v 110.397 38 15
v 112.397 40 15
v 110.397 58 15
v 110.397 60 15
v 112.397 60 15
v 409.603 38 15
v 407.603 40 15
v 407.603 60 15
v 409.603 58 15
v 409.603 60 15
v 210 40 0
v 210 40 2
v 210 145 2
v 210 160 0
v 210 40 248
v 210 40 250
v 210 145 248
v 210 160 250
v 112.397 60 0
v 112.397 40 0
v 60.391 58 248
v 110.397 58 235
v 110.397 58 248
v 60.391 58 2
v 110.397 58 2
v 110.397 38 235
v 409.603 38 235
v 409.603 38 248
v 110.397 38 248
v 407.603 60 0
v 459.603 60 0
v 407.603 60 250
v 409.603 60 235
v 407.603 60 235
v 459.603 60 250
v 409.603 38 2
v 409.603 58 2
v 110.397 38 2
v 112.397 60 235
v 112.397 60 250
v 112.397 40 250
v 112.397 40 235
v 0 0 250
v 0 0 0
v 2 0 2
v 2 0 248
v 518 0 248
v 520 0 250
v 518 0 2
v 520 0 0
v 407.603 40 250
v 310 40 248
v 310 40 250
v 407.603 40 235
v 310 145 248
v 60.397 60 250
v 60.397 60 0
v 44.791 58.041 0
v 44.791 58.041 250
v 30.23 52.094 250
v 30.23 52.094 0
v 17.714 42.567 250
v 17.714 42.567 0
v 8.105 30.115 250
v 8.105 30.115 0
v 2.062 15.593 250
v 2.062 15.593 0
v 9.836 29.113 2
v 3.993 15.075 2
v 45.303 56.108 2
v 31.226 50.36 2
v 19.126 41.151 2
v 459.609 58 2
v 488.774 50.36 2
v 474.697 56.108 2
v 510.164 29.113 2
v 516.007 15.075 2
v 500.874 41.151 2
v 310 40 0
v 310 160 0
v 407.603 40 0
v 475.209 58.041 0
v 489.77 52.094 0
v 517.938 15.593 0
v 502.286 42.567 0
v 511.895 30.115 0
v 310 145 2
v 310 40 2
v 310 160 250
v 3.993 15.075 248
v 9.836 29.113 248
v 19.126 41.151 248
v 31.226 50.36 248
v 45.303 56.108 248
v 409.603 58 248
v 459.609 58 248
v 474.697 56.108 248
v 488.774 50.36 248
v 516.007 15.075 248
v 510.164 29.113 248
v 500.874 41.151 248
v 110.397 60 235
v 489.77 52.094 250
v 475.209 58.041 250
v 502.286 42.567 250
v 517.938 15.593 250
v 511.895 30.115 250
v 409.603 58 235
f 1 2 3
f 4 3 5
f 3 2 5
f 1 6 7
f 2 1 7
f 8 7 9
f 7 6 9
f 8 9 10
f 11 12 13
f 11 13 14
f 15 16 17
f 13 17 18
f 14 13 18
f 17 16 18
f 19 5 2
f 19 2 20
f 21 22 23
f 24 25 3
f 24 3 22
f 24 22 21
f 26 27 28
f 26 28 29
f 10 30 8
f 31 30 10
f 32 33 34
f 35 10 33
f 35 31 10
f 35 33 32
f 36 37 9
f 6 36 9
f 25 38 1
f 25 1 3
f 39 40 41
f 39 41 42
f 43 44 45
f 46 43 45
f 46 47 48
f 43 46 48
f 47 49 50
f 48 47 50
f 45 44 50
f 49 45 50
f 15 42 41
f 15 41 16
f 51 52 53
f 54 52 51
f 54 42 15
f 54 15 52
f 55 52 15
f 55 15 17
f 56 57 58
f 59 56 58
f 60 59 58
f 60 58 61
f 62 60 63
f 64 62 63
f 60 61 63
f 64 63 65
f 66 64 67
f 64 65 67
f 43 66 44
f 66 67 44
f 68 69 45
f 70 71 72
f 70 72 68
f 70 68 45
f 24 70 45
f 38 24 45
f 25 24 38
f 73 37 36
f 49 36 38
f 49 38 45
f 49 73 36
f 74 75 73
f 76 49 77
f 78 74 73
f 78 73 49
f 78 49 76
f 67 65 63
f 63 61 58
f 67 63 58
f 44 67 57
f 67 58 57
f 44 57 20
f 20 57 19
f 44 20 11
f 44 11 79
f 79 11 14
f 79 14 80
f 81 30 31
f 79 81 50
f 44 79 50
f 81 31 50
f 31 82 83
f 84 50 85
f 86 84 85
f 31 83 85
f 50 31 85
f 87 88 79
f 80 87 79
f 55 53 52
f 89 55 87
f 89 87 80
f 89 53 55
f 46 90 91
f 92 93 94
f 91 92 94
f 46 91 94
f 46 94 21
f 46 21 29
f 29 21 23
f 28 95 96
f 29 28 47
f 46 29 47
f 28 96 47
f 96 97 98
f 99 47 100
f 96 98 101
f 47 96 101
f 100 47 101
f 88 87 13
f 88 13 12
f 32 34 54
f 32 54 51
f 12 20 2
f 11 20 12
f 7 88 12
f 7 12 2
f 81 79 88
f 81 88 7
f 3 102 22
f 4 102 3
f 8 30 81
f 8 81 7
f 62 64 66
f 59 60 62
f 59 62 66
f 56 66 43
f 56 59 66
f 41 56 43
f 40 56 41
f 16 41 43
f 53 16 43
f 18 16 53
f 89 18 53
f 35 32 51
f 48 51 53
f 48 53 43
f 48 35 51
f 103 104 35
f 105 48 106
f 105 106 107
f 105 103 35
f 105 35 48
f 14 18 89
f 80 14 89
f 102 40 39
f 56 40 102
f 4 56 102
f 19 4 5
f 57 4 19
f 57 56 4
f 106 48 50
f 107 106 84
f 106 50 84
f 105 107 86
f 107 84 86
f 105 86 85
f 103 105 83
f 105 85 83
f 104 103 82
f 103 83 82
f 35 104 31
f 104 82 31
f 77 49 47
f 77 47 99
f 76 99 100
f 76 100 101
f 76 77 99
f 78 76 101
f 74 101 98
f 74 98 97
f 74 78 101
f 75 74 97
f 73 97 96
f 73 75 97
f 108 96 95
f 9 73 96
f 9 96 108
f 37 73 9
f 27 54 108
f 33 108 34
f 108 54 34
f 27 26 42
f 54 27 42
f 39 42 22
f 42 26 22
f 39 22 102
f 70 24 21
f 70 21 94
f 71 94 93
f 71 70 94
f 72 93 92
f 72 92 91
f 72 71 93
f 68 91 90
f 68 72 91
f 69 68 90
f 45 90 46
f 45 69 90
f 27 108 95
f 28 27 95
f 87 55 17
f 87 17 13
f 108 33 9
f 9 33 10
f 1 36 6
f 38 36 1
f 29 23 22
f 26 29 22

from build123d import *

# Parameters (mm, degrees)
BOSS_EXTRUDE1_DEPTH = 250
SKETCH2_W           = 299.205309142
SKETCH2_H           = 220
CUT_EXTRUDE1_DEPTH  = 581.086200491
SKETCH4_W           = 299.205309142
SKETCH4_H           = 15
CUT_EXTRUDE2_DEPTH  = 20
SHELL1_START        = 2
SHELL1_DEPTH        = 246
SKETCH5_W           = 15
SKETCH5_H           = 20
BOSS_EXTRUDE2_DEPTH = 2
SKETCH6_W           = 15
SKETCH6_H           = 20
BOSS_EXTRUDE3_DEPTH = 2
SKETCH7_W           = 100
SKETCH7_H           = 120
BOSS_EXTRUDE4_DEPTH = 250
CUT_EXTRUDE3_DEPTH  = 100


# Read off the part's stored shape, not the designer's step: Shell1
with BuildPart() as part:
    # Sketch1 → Boss-Extrude1 (new body)
    with BuildSketch(Plane.XY):
        with BuildLine():
            Line((0, 0), (520, 0))
            ThreePointArc((520, 0), (502.285771516, 42.567121511), (459.602654571, 60))
            Line((459.602654571, 60), (60.397345429, 60))
            ThreePointArc((60.397345429, 60), (17.714228484, 42.567121511), (0, 0))
        make_face()
    extrude(amount=BOSS_EXTRUDE1_DEPTH)

    # Sketch2 → Cut-Extrude1 (cut, through all)
    with BuildSketch(Plane(origin=(0, 60, 0), x_dir=(1, 0, 0), z_dir=(0, 1, 0))):
        with Locations((260, -125)):
            Rectangle(SKETCH2_W, SKETCH2_H)
    extrude(amount=-CUT_EXTRUDE1_DEPTH, mode=Mode.SUBTRACT)

    # Sketch4 → Cut-Extrude2 (cut)
    with BuildSketch(Plane(origin=(0, 60, 0), x_dir=(1, 0, 0), z_dir=(0, 1, 0))):
        with Locations((260, -242.5)):
            Rectangle(SKETCH4_W, SKETCH4_H)
        with Locations((260, -7.5)):
            Rectangle(SKETCH4_W, SKETCH4_H)
    extrude(amount=-CUT_EXTRUDE2_DEPTH, mode=Mode.SUBTRACT)

    # Shell1 outline → Shell1 (cut)
    with BuildSketch(Plane.XY.offset(SHELL1_START)):
        with BuildLine():
            Line((110.397345429, 38), (110.397345429, 58))
            Line((110.397345429, 58), (60.390688921, 58))
            ThreePointArc((60.390688921, 58), (19.126088629, 41.15055453), (2, 0))
            Line((2, 0), (518, 0))
            ThreePointArc((518, 0), (500.873911371, 41.15055453), (459.609311079, 58))
            Line((459.609311079, 58), (409.602654571, 58))
            Line((409.602654571, 58), (409.602654571, 38))
            Line((409.602654571, 38), (110.397345429, 38))
        make_face()
    extrude(amount=SHELL1_DEPTH, mode=Mode.SUBTRACT)

    # Sketch5 → Boss-Extrude2 (add)
    with BuildSketch(Plane.ZY.offset(-409.602654571)):
        with Locations((7.5, 50)):
            Rectangle(SKETCH5_W, SKETCH5_H)
        with Locations((242.5, 50)):
            Rectangle(SKETCH5_W, SKETCH5_H)
    extrude(amount=BOSS_EXTRUDE2_DEPTH)

    # Sketch6 → Boss-Extrude3 (add)
    with BuildSketch(Plane(origin=(110.397345429, 0, 0), x_dir=(0, 0, -1), z_dir=(1, 0, 0))):
        with Locations((-242.5, 50)):
            Rectangle(SKETCH6_W, SKETCH6_H)
        with Locations((-7.5, 50)):
            Rectangle(SKETCH6_W, SKETCH6_H)
    extrude(amount=BOSS_EXTRUDE3_DEPTH)

    # Sketch7 → Boss-Extrude4 (add)
    with BuildSketch(Plane.XY.offset(250)):
        with Locations((260, 100)):
            Rectangle(SKETCH7_W, SKETCH7_H)
    extrude(amount=-BOSS_EXTRUDE4_DEPTH)

    # Sketch8 → Cut-Extrude3 (cut)
    with BuildSketch(Plane(origin=(310, 0, 0), x_dir=(0, 0, -1), z_dir=(1, 0, 0))):
        Polygon((-248, 145), (-2, 145), (-2, 40), (-15, 40), (-235, 40), (-248, 40), align=None)
    extrude(amount=-CUT_EXTRUDE3_DEPTH, mode=Mode.SUBTRACT)


solid = part.part
